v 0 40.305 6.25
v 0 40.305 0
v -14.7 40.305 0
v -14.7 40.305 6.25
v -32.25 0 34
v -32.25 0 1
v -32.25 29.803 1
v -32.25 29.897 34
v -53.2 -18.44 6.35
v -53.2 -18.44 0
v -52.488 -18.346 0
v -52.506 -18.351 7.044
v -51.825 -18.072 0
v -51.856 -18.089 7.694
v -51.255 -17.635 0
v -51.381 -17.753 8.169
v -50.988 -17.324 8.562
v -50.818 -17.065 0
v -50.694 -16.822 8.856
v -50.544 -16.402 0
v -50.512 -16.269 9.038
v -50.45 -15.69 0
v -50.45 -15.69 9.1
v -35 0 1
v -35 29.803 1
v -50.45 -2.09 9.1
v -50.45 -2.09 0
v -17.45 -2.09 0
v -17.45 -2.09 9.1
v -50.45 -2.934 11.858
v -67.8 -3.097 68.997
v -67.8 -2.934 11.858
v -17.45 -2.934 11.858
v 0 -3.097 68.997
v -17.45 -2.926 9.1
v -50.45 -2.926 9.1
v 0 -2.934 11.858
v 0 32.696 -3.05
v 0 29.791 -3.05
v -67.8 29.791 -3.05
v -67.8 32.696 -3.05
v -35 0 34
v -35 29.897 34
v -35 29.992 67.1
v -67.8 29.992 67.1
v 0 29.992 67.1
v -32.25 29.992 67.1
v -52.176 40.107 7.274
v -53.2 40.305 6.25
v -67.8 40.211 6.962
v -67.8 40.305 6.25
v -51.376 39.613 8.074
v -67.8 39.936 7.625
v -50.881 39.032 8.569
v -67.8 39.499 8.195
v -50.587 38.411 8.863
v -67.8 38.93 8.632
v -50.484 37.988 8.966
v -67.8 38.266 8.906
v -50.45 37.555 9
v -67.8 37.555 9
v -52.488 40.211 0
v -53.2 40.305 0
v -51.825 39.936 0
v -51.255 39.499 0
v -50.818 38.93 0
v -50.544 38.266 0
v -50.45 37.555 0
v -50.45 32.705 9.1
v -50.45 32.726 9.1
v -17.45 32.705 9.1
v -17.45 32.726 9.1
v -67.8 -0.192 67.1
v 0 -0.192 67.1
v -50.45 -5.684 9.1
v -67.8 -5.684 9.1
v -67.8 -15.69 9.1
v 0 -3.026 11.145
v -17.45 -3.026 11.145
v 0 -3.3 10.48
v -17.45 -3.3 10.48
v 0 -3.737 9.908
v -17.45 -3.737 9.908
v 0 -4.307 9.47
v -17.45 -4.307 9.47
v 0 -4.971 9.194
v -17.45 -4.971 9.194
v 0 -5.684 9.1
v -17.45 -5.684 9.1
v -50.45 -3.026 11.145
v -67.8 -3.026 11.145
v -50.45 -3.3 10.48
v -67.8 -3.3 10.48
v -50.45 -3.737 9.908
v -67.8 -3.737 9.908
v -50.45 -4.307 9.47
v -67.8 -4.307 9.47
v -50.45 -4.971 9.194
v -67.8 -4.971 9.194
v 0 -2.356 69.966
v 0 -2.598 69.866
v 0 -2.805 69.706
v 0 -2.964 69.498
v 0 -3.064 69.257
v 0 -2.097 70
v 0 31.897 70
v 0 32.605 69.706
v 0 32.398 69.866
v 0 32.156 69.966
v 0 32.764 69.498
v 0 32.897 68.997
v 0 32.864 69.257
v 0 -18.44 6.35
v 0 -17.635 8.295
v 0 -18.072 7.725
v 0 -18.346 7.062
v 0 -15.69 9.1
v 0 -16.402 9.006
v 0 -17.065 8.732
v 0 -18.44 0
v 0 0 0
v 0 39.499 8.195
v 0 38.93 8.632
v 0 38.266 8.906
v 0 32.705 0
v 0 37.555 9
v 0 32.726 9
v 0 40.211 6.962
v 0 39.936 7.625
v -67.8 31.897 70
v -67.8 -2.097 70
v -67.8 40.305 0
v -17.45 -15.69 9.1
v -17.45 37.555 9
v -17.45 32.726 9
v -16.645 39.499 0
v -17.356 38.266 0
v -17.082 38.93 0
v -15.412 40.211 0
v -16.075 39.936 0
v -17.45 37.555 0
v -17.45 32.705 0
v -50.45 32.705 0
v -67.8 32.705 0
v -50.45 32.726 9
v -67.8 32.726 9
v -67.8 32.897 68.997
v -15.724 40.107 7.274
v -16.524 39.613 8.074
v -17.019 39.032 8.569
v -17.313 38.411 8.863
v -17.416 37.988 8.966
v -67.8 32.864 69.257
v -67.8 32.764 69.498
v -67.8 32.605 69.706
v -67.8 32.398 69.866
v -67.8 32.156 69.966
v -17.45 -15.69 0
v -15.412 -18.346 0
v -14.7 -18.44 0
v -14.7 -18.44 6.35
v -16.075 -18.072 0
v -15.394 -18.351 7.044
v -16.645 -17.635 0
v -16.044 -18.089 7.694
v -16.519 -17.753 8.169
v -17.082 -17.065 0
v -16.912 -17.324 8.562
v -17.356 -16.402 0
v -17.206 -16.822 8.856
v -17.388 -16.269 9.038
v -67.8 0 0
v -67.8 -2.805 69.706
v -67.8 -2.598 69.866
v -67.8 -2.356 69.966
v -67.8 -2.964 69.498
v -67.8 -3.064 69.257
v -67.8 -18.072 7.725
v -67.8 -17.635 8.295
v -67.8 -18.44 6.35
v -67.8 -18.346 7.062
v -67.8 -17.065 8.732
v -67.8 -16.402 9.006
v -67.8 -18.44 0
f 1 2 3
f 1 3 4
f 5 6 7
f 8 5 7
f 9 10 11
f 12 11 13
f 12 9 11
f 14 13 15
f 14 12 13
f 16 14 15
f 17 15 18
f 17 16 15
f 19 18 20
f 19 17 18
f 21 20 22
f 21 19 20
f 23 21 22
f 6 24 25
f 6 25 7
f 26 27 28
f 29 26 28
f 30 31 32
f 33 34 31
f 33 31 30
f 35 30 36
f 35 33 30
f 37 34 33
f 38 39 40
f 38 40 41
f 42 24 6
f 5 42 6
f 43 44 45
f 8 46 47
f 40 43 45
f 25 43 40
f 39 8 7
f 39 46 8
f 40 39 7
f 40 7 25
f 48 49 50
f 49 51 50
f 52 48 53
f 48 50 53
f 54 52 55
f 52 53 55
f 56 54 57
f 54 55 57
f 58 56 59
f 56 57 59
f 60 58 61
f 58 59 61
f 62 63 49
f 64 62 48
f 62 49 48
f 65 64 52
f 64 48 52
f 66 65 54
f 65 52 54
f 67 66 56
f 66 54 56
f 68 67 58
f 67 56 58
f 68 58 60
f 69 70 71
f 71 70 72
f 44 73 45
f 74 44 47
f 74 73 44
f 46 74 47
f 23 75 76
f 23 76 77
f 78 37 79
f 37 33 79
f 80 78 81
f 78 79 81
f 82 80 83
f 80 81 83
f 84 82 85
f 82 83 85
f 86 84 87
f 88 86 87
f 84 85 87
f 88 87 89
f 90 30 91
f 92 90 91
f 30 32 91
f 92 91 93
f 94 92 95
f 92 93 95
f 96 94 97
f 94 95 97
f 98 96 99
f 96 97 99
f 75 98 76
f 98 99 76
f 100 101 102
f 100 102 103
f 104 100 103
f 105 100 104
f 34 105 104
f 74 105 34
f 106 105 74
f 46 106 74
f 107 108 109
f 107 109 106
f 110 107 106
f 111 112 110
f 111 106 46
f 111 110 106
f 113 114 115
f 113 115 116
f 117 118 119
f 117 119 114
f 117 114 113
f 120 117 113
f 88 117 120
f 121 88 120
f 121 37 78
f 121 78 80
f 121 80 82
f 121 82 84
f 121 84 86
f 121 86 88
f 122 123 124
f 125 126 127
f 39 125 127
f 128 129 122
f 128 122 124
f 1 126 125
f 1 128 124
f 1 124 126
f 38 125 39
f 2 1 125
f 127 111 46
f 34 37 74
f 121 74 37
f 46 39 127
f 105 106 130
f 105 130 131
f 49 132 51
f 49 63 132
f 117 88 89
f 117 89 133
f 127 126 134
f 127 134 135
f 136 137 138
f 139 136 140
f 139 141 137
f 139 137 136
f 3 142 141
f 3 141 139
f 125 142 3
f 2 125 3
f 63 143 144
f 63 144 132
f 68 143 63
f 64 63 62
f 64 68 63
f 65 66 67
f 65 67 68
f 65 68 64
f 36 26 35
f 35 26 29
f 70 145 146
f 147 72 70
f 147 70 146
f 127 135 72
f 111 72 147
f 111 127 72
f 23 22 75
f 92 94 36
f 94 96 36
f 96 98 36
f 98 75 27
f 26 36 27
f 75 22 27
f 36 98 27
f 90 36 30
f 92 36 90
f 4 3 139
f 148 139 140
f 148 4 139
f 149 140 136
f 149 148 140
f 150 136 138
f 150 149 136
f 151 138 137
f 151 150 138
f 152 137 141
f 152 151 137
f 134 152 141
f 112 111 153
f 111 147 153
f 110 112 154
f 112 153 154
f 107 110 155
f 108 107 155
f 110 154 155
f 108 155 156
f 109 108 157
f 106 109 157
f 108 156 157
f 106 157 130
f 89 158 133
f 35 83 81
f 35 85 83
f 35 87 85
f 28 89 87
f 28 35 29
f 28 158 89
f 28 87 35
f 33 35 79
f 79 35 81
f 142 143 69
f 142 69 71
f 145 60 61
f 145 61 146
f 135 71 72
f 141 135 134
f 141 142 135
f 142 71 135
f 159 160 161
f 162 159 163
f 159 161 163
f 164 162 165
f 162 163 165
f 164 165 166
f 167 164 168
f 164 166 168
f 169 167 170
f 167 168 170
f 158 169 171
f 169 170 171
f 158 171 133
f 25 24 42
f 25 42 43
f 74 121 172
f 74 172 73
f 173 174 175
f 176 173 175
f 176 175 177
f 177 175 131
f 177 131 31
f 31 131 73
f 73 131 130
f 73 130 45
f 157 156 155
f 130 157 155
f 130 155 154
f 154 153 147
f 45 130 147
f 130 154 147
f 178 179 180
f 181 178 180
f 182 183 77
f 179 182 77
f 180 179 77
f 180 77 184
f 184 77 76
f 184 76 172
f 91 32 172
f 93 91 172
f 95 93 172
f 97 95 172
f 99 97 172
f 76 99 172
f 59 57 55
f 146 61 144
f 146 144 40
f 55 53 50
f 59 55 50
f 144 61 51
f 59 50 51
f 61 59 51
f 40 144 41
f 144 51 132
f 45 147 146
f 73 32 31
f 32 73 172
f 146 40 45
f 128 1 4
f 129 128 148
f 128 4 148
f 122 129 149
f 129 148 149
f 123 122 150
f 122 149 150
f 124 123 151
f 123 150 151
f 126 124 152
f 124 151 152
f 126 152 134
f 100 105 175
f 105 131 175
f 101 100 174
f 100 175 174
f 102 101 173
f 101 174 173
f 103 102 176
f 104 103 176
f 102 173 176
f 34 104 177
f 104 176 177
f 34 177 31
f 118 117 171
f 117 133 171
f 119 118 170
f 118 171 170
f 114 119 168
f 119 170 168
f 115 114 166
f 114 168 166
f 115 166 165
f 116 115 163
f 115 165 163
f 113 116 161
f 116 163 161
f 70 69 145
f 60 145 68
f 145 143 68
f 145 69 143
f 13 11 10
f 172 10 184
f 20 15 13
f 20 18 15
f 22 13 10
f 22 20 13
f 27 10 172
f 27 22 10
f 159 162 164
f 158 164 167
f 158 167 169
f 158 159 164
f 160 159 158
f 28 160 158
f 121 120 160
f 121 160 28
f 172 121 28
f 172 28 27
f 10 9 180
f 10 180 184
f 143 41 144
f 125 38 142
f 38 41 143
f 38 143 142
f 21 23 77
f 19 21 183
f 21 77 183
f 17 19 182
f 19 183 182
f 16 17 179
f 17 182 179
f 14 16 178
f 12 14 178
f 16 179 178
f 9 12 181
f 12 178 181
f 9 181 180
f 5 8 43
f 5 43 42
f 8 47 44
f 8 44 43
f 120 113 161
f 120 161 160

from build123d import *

# Parameters (mm, degrees)
AUFSATZ_LINEAR_AUSTRAGEN1_DEPTH = 67.8
SKIZZE3_W                       = 33
SKIZZE3_H                       = 7.6
SKIZZE3_H_2                     = 16.35
SCHNITT_LINEAR_AUSTRAGEN1_DEPTH = 9.1
SKIZZE4_W                       = 2.75
SKIZZE4_H                       = 30.2
AUFSATZ_LINEAR_AUSTRAGEN2_DEPTH = 66.1
VERRUNDUNG1_R                   = 2.75
VERRUNDUNG3_R                   = 1
SCHNITT_LINEAR_AUSTRAGEN2_DEPTH = 35


with BuildPart() as part:
    # Skizze1 → Aufsatz-Linear austragen1 (new body)
    with BuildSketch(Plane(origin=(0, 0, 0), x_dir=(0, 0, -1), z_dir=(1, 0, 0))):
        Polygon((-67.1, 29.991702941), (3.049987553, 29.791286266), (3.049987553, 32.695849754), (0, 32.704563488), (0, 40.304563488), (-9, 40.304563488), (-9, 32.725724599), (-70, 32.9), (-70, -3.1), (-9.1, -2.926010297), (-9.1, -18.44), (0, -18.44), (0, 0), (-67.1, -0.191702941), align=None)
    extrude(amount=-AUFSATZ_LINEAR_AUSTRAGEN1_DEPTH)

    # Skizze3 → Schnitt-Linear austragen1 (cut)
    with BuildSketch(Plane.XY):
        with Locations((-33.95, 36.504563488)):
            Rectangle(SKIZZE3_W, SKIZZE3_H)
        with Locations((-33.95, -10.265)):
            Rectangle(SKIZZE3_W, SKIZZE3_H_2)
    extrude(amount=SCHNITT_LINEAR_AUSTRAGEN1_DEPTH, mode=Mode.SUBTRACT)

    # Skizze4 → Aufsatz-Linear austragen2 (add)
    with BuildSketch(Plane.XY.offset(1)):
        with Locations((-33.625, 15.1)):
            Rectangle(SKIZZE4_W, SKIZZE4_H)
    extrude(amount=AUFSATZ_LINEAR_AUSTRAGEN2_DEPTH)

    # Verrundung1
    verrundung1_edges = [part.edges().sort_by_distance(p)[0] for p in [
        (-59.125, -18.44, 9.1),
        (-59.125, -2.926010297, 9.1),
        (-59.125, 40.304563488, 9),
        (-8.725, 40.304563488, 9),
        (-17.45, 40.304563488, 4.5),
        (-50.45, 40.304563488, 4.5),
        (-8.725, -2.926010297, 9.1),
        (-8.725, -18.44, 9.1),
        (-17.45, -18.44, 4.55),
        (-50.45, -18.44, 4.55),
    ]]
    fillet(verrundung1_edges, radius=VERRUNDUNG1_R)

    # Verrundung3
    verrundung3_edges = [part.edges().sort_by_distance(p)[0] for p in [
        (-33.9, -3.1, 70),
        (-33.9, 32.9, 70),
    ]]
    fillet(verrundung3_edges, radius=VERRUNDUNG3_R)

    # Skizze6 → Schnitt-Linear austragen2 (cut)
    with BuildSketch(Plane(origin=(0, 0, 0), x_dir=(0, 0, -1), z_dir=(1, 0, 0))):
        Polygon((-67.1, 29.991702941), (-34, 29.897137109), (-34, -0.097137109), (-67.1, -0.191702941), align=None)
    extrude(amount=-SCHNITT_LINEAR_AUSTRAGEN2_DEPTH, mode=Mode.SUBTRACT)


solid = part.part
